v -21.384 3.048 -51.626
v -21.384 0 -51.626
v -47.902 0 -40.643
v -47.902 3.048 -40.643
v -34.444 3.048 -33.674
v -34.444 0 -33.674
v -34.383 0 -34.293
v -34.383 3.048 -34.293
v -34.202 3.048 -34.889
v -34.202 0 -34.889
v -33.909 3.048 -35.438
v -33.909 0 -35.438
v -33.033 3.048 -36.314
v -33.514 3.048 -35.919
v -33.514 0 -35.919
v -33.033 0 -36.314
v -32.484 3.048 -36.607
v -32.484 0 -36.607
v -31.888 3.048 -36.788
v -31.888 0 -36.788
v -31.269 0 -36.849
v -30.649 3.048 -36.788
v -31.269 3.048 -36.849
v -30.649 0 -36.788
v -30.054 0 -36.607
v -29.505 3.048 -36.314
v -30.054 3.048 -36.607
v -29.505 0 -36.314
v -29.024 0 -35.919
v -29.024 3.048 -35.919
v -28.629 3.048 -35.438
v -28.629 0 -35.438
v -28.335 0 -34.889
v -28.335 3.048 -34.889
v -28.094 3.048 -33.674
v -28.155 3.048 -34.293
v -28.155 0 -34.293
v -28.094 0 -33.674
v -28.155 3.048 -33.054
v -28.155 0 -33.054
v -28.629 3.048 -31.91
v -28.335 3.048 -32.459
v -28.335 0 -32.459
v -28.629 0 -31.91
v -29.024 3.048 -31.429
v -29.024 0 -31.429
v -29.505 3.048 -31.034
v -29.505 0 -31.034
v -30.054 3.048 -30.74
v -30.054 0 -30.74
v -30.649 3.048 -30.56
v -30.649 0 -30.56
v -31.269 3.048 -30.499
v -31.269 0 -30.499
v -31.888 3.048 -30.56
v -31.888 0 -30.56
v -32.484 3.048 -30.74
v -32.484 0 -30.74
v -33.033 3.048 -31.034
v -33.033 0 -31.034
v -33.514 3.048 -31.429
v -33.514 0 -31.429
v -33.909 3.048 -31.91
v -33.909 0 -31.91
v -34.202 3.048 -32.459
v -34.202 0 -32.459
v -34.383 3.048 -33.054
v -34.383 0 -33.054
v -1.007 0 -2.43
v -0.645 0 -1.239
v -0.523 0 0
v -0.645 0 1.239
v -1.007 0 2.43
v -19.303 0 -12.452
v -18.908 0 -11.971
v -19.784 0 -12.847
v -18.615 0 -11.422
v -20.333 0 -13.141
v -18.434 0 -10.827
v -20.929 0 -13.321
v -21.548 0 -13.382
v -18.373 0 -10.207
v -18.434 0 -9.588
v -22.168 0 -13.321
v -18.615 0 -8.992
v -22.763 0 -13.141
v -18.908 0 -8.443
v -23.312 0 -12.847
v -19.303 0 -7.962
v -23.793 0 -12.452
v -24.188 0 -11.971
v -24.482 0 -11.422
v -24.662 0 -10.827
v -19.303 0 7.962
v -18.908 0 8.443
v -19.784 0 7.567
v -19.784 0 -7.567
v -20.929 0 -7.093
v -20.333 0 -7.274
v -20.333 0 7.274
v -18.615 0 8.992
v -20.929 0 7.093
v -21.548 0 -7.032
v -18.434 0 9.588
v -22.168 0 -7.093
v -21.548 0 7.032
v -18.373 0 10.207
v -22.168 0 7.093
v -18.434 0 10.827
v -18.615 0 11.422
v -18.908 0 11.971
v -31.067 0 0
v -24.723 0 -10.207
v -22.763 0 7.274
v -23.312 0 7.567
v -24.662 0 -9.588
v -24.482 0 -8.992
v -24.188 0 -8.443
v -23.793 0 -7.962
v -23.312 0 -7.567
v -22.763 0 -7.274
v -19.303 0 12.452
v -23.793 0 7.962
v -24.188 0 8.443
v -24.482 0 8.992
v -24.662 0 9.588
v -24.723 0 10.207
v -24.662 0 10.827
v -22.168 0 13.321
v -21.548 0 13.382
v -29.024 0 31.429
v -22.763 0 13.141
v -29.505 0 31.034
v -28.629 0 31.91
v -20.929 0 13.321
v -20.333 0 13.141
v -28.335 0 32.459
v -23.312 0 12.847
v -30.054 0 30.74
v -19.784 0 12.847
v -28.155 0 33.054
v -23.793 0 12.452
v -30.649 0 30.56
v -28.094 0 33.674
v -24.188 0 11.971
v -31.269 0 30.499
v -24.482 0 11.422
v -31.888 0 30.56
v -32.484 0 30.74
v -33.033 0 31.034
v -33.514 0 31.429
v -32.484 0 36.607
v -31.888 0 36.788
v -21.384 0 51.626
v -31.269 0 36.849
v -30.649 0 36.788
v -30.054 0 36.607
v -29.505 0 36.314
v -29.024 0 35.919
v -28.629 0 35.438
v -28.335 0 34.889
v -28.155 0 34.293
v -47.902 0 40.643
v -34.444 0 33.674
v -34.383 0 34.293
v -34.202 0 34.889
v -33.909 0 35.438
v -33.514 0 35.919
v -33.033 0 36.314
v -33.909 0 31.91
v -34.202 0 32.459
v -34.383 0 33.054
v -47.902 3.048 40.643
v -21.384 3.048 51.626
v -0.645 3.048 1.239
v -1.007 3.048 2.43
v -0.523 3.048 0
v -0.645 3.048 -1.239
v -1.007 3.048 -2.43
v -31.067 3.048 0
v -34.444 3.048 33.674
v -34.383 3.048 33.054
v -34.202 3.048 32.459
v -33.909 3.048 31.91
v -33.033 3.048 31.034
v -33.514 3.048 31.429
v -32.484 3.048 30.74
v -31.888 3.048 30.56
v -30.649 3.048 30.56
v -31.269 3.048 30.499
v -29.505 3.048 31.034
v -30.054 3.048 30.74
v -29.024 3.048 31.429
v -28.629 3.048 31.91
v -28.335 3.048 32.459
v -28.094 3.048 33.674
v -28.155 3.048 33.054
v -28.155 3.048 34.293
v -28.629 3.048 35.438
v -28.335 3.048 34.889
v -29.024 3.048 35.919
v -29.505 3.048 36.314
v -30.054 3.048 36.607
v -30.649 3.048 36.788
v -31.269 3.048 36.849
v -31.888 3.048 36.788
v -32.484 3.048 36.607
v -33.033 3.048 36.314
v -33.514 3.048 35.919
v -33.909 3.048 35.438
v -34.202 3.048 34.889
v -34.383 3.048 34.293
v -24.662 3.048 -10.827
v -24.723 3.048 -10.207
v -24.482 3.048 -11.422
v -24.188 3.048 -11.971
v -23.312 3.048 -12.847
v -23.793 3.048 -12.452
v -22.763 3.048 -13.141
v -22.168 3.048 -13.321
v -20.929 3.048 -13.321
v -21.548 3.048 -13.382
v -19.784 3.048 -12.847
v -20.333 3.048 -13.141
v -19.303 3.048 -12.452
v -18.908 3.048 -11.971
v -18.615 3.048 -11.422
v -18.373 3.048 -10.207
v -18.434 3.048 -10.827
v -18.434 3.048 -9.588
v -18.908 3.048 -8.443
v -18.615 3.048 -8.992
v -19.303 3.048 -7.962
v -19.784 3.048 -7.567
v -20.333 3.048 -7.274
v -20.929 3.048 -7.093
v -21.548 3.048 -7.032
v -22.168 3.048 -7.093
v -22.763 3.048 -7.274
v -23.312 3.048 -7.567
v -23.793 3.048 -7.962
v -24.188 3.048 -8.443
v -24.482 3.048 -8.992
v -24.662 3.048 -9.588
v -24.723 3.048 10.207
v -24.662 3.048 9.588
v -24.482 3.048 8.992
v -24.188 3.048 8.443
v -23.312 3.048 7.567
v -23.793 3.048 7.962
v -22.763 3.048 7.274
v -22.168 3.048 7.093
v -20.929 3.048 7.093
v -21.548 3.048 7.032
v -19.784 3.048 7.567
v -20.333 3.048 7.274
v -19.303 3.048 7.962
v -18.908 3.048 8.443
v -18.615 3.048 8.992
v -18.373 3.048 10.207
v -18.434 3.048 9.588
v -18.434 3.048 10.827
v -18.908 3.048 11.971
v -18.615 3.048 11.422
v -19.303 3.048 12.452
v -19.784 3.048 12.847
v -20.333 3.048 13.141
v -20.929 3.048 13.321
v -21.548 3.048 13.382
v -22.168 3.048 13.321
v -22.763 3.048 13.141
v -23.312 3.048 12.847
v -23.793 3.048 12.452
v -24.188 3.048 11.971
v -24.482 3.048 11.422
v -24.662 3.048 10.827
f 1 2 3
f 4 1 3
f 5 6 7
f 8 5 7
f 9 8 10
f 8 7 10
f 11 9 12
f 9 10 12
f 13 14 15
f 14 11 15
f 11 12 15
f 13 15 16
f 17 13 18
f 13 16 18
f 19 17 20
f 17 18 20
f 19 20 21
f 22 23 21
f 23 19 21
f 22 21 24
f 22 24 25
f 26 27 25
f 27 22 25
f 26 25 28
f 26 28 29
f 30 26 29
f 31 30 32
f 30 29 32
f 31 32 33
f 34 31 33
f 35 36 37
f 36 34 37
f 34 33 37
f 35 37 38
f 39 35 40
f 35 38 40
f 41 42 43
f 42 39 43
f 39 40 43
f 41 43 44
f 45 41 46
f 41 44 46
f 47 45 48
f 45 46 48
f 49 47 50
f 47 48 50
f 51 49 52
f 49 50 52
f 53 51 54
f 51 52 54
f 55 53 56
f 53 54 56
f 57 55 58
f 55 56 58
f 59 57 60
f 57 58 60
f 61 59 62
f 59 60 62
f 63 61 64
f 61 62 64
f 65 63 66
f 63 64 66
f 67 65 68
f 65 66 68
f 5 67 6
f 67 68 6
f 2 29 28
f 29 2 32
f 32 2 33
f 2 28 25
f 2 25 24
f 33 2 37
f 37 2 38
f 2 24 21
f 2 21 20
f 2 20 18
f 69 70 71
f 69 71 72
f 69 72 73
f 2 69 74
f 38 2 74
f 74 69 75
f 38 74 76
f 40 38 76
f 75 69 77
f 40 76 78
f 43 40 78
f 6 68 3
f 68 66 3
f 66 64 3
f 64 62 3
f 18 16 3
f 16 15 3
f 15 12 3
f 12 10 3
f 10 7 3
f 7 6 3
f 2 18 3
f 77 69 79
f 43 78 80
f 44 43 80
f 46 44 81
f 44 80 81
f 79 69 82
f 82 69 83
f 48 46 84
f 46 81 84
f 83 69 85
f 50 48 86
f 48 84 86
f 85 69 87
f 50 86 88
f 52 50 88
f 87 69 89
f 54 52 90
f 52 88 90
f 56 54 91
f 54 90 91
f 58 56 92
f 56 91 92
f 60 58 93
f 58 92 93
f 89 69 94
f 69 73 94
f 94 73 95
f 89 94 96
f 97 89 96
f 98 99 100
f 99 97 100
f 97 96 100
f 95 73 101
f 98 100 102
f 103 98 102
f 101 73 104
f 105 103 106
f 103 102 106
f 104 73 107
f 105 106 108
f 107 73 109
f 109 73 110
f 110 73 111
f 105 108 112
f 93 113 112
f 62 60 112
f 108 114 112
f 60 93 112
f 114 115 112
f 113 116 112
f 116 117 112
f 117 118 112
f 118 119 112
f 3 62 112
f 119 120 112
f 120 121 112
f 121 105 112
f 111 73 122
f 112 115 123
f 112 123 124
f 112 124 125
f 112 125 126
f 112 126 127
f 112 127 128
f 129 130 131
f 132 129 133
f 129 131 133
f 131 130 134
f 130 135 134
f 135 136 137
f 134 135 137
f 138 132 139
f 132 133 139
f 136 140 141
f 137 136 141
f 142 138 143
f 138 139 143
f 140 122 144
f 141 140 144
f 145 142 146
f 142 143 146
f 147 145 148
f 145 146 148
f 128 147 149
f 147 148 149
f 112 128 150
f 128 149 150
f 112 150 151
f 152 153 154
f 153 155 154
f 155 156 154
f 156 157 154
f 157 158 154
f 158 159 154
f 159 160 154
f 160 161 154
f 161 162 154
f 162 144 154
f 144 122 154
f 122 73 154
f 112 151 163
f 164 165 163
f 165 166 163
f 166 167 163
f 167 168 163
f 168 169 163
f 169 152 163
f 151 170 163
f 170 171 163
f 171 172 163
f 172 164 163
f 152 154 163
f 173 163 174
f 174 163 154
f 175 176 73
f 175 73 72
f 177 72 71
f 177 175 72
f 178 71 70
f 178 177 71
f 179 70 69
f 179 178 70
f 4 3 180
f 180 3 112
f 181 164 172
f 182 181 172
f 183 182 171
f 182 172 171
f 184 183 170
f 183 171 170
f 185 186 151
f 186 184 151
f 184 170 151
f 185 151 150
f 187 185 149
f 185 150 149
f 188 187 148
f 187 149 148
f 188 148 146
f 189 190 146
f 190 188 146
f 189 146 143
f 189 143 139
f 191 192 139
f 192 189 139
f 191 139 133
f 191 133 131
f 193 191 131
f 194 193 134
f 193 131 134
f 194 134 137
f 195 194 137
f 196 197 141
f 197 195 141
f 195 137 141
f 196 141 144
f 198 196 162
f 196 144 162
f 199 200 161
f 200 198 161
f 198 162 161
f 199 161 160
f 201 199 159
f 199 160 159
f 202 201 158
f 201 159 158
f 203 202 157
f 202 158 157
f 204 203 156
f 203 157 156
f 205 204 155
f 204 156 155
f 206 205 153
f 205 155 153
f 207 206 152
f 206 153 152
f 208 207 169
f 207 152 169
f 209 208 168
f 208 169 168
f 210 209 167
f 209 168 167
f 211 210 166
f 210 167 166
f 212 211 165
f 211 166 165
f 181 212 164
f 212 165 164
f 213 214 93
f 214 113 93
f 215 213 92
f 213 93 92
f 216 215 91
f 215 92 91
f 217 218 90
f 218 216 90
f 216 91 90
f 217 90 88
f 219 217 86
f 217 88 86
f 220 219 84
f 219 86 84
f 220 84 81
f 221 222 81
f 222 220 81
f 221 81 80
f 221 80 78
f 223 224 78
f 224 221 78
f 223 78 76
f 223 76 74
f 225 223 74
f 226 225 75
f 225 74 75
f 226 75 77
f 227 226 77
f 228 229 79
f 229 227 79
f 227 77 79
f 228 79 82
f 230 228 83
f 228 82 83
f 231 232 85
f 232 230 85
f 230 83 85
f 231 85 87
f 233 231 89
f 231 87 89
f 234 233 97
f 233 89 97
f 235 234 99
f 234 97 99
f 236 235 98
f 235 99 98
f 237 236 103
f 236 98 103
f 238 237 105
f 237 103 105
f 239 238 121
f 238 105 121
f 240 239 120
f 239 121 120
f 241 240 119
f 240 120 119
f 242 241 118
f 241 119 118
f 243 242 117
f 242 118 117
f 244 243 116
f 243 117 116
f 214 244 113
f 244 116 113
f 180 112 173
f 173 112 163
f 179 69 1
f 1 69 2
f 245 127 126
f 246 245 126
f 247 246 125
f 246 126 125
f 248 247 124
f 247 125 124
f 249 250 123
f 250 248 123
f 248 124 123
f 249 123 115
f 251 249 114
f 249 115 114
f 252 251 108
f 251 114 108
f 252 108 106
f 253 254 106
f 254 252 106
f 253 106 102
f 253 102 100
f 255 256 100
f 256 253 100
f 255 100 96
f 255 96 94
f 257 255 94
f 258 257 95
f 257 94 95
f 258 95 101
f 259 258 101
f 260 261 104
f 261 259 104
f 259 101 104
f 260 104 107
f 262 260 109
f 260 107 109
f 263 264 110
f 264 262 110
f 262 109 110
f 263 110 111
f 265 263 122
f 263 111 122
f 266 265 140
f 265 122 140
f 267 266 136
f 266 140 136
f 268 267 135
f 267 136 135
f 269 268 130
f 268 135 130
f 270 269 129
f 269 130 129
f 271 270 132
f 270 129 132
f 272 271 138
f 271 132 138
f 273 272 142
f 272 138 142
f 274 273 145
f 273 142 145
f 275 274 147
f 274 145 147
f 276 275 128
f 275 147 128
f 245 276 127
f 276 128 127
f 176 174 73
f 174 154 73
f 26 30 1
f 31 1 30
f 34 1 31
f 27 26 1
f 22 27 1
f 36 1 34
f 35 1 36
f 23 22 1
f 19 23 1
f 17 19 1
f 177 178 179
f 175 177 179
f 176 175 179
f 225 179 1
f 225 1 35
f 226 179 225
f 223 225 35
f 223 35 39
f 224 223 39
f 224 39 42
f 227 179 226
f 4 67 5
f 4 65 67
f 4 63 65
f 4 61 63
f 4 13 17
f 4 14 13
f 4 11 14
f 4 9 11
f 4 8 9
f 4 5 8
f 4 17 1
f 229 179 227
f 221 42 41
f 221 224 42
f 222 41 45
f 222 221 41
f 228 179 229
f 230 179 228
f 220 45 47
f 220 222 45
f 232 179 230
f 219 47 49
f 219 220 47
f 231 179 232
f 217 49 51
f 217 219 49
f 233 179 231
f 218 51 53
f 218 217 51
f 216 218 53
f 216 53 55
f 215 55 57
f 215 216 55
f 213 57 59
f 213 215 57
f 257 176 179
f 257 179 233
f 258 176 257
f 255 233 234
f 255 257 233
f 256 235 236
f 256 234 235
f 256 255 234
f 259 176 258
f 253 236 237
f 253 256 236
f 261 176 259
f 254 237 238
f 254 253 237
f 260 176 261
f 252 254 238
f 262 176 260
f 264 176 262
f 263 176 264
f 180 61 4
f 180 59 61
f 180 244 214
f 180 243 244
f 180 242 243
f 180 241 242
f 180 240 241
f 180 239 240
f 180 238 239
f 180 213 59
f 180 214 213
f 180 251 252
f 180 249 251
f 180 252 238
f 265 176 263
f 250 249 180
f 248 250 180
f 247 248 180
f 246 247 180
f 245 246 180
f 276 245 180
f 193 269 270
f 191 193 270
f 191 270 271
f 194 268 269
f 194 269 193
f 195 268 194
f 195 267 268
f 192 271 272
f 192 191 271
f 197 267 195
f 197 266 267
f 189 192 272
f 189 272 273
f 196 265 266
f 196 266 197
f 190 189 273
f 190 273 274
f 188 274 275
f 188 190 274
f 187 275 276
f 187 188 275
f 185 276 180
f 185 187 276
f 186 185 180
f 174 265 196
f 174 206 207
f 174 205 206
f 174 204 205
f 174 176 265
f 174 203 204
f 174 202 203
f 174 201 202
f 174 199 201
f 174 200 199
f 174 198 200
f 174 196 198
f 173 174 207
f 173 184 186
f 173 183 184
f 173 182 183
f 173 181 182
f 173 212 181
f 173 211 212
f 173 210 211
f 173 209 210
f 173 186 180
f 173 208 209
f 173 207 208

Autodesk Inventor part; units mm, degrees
ref_plane "YZ Plane" through (0, 0, 0) normal (1, 0, 0) x (0, 1, 0)
ref_plane "XZ Plane" through (0, 0, 0) normal (0, 1, 0) x (-1, 0, 0)
ref_plane "XY Plane" through (0, 0, 0) normal (0, 0, 1) x (1, 0, 0)
sketch "Sketch1" plane through (0, 0, 0) normal (0, 1, 0) x (-1, 0, 0)
  line L0 (0, 0) -> (21.3844, -51.6264)
  line L1 (21.3844, -51.6264) -> (47.9015, -40.6426)
  line L2 (47.9015, -40.6426) -> (31.0668, 0)
  line L3 (31.0668, 0) -> (47.9015, 40.6426)
  line L4 (47.9015, 40.6426) -> (21.3844, 51.6264)
  line L5 (21.3844, 51.6264) -> (0, 0)
  line L6 (31.0668, 0) -> (0, 0) construction
  line L7 (17.3204, 0) -> (56.2011, 93.8662) construction
  circle A0 centre (50.7089, 80.6068) radius 3.175
  circle A1 centre (40.9887, 57.1403) radius 3.175
  circle A2 centre (31.2686, 33.6737) radius 3.175
  circle A3 centre (21.5484, 10.2072) radius 3.175
  line L8 (13.0041, 3.7198) -> (13.0041, -3.7198) construction
  line L9 (13.0041, 0) -> (1.9044, 4.5976) construction
  line L10 (32.6076, 3.7198) -> (1.5408, 3.7198) construction
  line L11 (1.5408, -3.7198) -> (32.6076, -3.7198) construction
  circle A4 centre (21.5484, -10.2072) radius 3.175
  circle A5 centre (31.2686, -33.6737) radius 3.175
  dimension "d0" = 28.702
  dimension "d1" = 135
  dimension "d2" = 55.88
  dimension "d3" = 101.6
  dimension "d4" = 6.35
  dimension "d7" = 25.4
  dimension "d12" = 3.7198
  dimension "d13" = 12.7
  dimension "d14" = 12.0142
  dimension "d15" = 12.7
extrude "Plate1" add sketch "Sketch1" along normal blind 3.048 contours L5 L4 L3 L2 L1 L0
fillet "Corner Round1" radius 6.35 1 edges at (0, 1.524, 0)
equation "\"d3\" = 0.5 * CornerLength"
equation "\"BendRadius\" = Thickness"
equation "\"BendReliefWidth\" = Thickness"
equation "\"BendReliefDepth\" = 0.5 * Thickness"
equation "\"CornerReliefSize\" = 4 * Thickness"
equation "\"MinimumRemnant\" = 2 * Thickness"
equation "\"TransitionRadius\" = BendRadius"
equation "\"JacobiRadiusSize\" = BendRadius"
equation "\"GapSize\" = Thickness"
equation "\"d16\" = BendRadius"
equation "\"CornerLength\" = 203.2"
equation "\"Thickness\" = 3.048"
properties part number "CornerBracketSheetMetal"
